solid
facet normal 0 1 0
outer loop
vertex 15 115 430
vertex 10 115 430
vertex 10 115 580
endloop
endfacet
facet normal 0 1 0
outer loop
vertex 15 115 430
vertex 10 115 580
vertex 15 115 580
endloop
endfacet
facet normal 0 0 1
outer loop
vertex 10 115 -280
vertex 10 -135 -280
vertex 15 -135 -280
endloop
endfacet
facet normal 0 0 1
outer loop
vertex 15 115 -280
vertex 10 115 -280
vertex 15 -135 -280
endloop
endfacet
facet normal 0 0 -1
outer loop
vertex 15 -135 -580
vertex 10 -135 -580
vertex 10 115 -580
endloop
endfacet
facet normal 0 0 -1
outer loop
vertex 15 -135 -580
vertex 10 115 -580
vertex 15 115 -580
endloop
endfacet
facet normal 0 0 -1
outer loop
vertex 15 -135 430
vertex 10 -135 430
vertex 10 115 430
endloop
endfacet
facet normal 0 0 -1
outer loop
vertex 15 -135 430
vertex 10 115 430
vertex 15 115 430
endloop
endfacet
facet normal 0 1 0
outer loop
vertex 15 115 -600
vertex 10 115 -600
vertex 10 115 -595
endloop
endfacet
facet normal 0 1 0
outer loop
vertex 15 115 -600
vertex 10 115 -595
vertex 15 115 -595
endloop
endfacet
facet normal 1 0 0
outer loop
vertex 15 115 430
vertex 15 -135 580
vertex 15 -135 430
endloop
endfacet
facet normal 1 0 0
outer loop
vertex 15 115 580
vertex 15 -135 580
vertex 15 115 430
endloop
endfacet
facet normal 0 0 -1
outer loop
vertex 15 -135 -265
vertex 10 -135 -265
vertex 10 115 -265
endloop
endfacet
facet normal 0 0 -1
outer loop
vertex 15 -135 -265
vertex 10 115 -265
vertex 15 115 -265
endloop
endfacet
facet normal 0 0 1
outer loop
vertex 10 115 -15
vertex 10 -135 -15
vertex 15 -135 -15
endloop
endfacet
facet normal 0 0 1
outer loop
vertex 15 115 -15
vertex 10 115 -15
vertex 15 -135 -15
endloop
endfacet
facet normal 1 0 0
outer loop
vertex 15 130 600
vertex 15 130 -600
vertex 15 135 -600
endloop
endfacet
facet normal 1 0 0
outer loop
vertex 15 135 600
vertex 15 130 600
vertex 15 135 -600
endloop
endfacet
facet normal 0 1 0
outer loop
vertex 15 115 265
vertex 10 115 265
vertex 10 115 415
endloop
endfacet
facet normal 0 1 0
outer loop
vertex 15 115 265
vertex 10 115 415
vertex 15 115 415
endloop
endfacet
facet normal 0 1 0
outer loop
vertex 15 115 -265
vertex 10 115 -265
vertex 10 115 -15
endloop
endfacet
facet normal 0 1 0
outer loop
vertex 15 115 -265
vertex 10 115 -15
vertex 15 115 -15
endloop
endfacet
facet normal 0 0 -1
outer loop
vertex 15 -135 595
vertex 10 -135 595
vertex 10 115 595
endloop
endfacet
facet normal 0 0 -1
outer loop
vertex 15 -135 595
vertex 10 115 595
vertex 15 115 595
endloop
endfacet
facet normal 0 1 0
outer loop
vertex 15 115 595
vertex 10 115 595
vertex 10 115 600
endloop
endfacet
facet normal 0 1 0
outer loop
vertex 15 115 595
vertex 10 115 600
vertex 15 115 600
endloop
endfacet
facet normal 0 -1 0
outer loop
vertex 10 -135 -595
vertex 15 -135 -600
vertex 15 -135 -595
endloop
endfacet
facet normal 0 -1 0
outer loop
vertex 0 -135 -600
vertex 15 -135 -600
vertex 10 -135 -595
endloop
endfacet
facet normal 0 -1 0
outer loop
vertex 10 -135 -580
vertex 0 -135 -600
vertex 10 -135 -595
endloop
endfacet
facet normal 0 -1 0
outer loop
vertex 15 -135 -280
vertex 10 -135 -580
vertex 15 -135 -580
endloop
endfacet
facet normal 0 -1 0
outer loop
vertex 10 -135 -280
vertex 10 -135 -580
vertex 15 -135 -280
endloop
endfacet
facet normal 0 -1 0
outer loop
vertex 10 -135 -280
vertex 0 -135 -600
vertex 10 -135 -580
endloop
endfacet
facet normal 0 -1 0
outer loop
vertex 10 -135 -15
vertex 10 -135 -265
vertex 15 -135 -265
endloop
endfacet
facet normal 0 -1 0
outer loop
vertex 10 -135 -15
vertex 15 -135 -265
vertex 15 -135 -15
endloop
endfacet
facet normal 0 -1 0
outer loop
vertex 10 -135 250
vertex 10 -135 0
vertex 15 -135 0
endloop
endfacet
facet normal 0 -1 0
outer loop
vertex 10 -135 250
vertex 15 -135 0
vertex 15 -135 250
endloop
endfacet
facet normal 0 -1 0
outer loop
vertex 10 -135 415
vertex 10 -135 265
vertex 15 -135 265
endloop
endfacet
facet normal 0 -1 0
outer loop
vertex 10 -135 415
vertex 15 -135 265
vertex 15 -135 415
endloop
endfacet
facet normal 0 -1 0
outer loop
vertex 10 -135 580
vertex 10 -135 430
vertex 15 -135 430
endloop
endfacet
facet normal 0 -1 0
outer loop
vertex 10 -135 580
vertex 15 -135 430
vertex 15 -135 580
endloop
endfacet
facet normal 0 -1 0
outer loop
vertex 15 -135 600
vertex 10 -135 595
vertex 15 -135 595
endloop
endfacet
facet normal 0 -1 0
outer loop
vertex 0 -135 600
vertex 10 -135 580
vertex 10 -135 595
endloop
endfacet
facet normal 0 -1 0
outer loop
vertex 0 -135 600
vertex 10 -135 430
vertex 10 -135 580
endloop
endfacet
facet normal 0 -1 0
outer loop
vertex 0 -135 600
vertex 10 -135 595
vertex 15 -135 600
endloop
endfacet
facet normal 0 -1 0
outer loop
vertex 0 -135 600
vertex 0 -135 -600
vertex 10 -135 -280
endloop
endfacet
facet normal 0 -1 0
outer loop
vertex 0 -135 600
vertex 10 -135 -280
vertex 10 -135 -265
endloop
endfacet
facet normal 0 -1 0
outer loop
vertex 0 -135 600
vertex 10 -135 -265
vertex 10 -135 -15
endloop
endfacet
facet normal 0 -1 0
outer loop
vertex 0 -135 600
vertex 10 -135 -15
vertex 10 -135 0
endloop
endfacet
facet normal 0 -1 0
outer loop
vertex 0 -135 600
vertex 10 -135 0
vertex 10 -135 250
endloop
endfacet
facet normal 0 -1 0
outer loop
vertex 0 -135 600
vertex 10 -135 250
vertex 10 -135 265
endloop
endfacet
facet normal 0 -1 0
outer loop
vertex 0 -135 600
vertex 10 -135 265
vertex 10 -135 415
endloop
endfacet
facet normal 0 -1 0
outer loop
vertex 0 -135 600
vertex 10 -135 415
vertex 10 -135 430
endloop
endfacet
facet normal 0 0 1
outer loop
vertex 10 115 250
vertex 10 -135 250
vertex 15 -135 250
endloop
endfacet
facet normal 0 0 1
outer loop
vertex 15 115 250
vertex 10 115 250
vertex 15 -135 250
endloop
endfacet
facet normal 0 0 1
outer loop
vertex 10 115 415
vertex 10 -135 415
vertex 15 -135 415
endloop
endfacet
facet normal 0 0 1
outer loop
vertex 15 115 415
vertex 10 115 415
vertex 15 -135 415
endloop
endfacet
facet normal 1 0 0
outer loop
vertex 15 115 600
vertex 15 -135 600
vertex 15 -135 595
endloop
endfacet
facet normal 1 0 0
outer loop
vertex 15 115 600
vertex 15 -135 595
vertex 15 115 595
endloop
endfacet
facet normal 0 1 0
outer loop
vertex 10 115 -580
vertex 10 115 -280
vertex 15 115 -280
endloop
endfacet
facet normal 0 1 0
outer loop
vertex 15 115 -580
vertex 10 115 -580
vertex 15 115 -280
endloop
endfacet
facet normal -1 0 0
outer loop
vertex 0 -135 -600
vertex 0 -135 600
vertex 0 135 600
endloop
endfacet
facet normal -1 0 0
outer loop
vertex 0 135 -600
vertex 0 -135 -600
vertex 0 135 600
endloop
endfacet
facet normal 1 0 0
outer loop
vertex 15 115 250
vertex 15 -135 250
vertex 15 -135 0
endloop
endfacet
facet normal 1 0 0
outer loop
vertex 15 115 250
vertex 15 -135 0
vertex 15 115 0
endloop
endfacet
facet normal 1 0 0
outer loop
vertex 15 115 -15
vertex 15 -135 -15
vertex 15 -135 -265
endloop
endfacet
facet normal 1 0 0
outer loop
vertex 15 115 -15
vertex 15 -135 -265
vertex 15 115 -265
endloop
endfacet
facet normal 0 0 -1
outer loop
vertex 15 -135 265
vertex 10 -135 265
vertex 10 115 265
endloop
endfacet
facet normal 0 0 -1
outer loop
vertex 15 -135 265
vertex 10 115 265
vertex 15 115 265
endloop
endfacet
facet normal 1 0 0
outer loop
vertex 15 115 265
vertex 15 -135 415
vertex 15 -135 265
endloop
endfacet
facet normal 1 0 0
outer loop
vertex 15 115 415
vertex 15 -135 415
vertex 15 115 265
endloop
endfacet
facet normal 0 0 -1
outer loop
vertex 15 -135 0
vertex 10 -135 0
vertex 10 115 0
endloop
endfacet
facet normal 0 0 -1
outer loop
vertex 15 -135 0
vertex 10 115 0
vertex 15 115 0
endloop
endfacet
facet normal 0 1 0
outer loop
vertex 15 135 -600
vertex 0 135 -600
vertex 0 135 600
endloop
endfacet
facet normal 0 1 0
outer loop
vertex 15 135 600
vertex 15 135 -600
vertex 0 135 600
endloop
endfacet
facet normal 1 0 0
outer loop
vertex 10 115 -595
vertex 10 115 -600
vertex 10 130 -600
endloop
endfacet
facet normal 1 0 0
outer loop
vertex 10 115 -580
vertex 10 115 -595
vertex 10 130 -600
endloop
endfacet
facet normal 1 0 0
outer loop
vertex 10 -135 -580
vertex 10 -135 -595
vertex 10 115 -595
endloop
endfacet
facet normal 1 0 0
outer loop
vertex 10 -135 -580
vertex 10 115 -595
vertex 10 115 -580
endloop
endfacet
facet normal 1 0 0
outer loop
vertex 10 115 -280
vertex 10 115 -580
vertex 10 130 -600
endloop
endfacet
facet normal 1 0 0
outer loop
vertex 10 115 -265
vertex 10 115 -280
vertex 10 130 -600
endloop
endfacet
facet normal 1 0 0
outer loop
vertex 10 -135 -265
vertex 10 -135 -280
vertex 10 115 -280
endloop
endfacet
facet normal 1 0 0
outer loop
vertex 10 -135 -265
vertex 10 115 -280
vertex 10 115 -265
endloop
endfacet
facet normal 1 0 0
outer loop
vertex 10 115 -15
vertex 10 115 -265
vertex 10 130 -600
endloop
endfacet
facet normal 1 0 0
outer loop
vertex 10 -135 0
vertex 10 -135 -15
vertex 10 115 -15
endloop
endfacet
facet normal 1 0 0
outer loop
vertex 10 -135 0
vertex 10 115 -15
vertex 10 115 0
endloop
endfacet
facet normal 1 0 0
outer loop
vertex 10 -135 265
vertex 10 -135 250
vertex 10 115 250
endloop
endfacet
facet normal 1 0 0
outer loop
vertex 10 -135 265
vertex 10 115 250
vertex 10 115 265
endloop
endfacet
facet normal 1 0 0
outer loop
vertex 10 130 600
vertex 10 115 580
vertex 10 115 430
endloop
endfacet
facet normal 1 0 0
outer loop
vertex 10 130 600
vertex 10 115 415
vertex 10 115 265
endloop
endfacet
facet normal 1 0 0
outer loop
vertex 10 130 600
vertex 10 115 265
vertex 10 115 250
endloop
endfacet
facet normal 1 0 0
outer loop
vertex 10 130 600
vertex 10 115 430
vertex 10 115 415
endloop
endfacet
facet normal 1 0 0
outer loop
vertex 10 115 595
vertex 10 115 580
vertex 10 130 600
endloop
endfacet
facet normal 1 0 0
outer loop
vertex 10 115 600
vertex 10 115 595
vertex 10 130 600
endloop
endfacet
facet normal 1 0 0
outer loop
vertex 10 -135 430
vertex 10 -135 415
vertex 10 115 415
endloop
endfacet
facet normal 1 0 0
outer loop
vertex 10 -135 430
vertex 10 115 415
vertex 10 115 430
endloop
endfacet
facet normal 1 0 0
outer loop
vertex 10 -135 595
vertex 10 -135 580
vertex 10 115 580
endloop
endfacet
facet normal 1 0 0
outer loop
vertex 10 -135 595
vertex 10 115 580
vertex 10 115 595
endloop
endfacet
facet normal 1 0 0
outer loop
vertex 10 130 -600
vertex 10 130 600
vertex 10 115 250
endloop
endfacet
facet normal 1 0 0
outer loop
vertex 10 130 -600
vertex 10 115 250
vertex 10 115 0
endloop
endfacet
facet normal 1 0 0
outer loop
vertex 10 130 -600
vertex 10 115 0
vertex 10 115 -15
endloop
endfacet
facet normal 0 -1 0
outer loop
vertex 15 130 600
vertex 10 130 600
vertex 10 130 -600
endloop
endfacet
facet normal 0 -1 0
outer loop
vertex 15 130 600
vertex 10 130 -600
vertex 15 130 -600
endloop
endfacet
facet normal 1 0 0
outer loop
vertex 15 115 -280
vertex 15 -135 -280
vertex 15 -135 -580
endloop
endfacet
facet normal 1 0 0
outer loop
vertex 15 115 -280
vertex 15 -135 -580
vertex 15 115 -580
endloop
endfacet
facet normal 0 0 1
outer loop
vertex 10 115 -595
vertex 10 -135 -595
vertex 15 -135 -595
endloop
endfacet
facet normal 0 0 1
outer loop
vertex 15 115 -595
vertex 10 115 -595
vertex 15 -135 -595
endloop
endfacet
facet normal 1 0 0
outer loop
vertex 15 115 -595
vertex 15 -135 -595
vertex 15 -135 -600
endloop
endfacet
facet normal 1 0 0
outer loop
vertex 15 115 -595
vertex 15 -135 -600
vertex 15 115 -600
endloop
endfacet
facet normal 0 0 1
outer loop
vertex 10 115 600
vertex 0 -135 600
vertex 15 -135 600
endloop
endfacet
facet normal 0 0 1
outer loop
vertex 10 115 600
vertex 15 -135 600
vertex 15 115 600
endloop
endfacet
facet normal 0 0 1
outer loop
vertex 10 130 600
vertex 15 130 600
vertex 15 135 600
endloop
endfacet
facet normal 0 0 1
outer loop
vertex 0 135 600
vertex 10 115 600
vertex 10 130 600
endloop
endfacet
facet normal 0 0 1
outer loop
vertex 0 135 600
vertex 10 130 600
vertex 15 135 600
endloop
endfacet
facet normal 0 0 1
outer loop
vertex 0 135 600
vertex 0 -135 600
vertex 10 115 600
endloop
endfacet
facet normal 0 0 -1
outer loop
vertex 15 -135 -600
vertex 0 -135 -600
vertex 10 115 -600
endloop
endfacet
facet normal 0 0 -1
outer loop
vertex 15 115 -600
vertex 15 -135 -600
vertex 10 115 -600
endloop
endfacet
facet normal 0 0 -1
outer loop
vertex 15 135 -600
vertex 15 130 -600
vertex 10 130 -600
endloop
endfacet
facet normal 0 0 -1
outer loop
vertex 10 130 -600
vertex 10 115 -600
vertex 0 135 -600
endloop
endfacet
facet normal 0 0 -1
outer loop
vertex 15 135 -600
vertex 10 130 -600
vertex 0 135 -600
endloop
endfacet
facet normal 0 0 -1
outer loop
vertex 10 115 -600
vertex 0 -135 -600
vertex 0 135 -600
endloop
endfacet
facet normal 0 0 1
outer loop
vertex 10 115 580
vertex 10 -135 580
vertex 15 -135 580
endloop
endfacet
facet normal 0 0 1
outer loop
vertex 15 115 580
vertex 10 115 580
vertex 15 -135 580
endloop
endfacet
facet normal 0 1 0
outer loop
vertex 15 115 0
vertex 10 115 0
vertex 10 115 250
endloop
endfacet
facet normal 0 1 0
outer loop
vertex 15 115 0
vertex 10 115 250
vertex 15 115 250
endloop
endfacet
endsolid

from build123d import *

# Parameters (mm, degrees)
F0_W     = 270
F0_H     = 1200
F1_DEPTH = 15
F2_W     = 5
F2_H     = 15
F3_DEPTH = 1200
F4_W     = 5
F4_H     = 15
F5_DEPTH = 250


with BuildPart() as f1:
    # F0 (on Right) → F1 (new body)
    with BuildSketch(Plane.YZ):
        Rectangle(F0_W, F0_H)
    extrude(amount=F1_DEPTH)

    # F2 (on face) → F3 (cut, through all)
    with BuildSketch(Plane(origin=(0, 0, -600), x_dir=(1, 0, 0), z_dir=(0, 0, -1))):
        with Locations((12.5, -122.5)):
            Rectangle(F2_W, F2_H)
    extrude(amount=-F3_DEPTH, mode=Mode.SUBTRACT)

    # F4 (on face) → F5 (cut, through all)
    with BuildSketch(Plane.XZ.offset(135)):
        with Locations((12.5, -587.5)):
            Rectangle(F4_W, F4_H)
        with Locations((12.5, -272.5)):
            Rectangle(F4_W, F4_H)
        with Locations((12.5, -7.5)):
            Rectangle(F4_W, F4_H)
        with Locations((12.5, 257.5)):
            Rectangle(F4_W, F4_H)
        with Locations((12.5, 422.5)):
            Rectangle(F4_W, F4_H)
        with Locations((12.5, 587.5)):
            Rectangle(F4_W, F4_H)
    extrude(amount=-F5_DEPTH, mode=Mode.SUBTRACT)


solid = f1.part
